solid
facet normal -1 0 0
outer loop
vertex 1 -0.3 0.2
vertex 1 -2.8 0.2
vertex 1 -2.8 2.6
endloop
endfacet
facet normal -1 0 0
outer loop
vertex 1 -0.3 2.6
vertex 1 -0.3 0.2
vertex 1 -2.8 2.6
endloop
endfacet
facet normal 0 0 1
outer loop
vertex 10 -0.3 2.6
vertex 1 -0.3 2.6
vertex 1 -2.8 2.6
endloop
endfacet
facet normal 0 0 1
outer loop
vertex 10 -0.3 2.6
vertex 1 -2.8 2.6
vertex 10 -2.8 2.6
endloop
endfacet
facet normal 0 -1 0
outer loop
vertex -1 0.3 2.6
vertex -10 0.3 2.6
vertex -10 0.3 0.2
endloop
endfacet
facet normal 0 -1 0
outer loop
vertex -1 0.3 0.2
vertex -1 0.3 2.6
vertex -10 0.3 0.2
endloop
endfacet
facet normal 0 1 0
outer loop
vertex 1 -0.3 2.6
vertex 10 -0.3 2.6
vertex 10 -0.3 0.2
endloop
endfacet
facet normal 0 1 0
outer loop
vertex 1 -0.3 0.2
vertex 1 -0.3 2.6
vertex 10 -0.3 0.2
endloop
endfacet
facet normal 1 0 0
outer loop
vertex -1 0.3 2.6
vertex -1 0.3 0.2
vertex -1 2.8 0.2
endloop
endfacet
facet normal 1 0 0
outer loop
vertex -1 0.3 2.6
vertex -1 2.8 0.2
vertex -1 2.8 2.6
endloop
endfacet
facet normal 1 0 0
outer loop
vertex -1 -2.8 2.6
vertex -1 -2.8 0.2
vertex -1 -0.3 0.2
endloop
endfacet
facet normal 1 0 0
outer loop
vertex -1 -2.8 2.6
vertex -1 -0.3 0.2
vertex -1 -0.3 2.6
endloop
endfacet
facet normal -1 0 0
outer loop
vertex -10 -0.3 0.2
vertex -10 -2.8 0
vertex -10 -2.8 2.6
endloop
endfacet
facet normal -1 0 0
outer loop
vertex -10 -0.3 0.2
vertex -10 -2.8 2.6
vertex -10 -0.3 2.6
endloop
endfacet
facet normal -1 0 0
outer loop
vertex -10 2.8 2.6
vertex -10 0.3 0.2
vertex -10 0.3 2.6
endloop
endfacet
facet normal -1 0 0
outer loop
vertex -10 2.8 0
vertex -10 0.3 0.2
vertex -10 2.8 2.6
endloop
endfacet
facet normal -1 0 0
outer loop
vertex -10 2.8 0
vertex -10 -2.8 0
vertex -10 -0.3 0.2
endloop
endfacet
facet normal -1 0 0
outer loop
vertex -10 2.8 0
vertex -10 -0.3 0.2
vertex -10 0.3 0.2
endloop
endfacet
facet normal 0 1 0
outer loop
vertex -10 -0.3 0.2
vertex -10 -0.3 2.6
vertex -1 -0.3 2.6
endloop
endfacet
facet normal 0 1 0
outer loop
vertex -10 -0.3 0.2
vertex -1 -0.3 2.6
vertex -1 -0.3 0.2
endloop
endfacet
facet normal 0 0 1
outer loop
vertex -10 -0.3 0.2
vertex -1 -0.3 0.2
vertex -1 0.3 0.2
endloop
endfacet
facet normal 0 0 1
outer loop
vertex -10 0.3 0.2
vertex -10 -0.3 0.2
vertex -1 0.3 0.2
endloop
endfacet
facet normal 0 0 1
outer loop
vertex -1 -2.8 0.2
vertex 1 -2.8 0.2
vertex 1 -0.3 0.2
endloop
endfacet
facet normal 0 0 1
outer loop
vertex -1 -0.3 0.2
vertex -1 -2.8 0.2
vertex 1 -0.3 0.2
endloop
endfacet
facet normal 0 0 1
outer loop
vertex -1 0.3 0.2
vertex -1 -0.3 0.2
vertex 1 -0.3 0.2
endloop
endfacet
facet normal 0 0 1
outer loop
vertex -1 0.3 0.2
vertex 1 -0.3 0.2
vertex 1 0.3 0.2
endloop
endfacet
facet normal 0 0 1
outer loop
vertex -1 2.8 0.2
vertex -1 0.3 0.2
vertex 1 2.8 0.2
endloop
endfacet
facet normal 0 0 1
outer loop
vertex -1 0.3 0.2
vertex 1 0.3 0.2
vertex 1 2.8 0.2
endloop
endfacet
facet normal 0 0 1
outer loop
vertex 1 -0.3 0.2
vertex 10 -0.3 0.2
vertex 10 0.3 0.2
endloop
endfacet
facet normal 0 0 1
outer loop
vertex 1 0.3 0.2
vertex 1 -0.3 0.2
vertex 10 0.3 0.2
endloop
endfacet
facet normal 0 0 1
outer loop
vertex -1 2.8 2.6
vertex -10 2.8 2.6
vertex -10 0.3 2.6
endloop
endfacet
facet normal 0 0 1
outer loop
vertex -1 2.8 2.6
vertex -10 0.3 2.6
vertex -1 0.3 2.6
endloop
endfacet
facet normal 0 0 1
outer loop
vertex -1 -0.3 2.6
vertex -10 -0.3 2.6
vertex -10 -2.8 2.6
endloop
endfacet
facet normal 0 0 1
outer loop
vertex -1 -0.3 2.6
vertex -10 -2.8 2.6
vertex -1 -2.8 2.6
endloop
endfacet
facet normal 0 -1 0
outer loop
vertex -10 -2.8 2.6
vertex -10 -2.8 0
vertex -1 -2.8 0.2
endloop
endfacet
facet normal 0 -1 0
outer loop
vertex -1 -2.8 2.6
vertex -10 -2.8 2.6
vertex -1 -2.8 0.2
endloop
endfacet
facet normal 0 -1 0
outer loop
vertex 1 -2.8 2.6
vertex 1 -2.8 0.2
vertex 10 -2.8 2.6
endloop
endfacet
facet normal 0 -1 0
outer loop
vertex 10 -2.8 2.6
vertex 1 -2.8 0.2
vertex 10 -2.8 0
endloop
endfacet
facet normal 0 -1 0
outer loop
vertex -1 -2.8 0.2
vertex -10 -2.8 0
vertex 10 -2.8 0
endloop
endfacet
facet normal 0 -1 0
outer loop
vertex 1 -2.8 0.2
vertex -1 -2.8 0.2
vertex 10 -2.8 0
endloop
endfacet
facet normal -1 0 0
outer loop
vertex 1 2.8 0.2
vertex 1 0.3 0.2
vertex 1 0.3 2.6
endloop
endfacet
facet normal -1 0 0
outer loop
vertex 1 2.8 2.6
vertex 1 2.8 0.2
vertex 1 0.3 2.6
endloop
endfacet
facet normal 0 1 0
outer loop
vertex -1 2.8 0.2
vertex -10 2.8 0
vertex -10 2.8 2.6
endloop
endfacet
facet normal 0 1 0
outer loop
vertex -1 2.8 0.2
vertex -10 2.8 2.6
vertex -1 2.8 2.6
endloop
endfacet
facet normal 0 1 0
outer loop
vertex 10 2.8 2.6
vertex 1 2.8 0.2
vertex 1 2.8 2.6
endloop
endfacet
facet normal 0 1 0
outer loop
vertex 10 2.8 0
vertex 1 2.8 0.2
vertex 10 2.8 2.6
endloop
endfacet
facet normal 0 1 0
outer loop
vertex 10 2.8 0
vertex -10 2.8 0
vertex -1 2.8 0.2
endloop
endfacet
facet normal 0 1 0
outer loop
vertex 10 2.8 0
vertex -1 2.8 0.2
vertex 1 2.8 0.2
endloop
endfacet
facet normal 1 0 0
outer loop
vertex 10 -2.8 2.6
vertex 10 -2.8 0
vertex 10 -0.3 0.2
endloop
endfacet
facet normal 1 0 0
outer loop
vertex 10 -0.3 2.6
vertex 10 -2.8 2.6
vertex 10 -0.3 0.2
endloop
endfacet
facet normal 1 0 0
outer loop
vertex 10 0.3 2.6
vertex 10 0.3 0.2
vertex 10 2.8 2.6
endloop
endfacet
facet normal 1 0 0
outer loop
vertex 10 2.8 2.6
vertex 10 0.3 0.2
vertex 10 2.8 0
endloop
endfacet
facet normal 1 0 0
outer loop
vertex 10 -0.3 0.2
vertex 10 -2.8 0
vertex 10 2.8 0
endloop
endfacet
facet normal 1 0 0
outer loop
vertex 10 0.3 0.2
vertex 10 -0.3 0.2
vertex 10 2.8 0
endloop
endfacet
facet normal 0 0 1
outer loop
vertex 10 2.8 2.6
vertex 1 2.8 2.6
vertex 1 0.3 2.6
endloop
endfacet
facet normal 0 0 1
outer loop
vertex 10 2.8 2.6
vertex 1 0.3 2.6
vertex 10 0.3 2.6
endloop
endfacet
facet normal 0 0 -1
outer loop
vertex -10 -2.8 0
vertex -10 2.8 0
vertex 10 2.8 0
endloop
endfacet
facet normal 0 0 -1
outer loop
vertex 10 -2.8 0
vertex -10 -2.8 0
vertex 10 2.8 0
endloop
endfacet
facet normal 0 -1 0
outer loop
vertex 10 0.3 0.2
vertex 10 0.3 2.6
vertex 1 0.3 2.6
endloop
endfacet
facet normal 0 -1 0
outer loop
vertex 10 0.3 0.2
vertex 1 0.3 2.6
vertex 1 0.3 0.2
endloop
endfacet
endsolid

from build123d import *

# Parameters (mm, degrees)
SKETCH_1_W          = 20
SKETCH_1_H          = 5.6
EXTRUDE_1_DEPTH     = 2.6
SKETCH_2_W          = 2.4
SKETCH_2_H          = 0.6
CUT_EXTRUDE_1_DEPTH = 21
SKETCH_3_W          = 2
SKETCH_3_H          = 2.4
CUT_EXTRUDE_2_DEPTH = 6.6


with BuildPart() as part:
    # 草图1 → 凸台-拉伸1 (new body)
    with BuildSketch(Plane.XY):
        Rectangle(SKETCH_1_W, SKETCH_1_H)
    extrude(amount=EXTRUDE_1_DEPTH)

    # 草图2 → 切除-拉伸1 (cut, through all)
    with BuildSketch(Plane(origin=(10, 0, 0), x_dir=(0, 0, -1), z_dir=(1, 0, 0))):
        with Locations((-1.4, 0)):
            Rectangle(SKETCH_2_W, SKETCH_2_H)
    extrude(amount=-CUT_EXTRUDE_1_DEPTH, mode=Mode.SUBTRACT)

    # 草图3 → 切除-拉伸2 (cut, through all)
    with BuildSketch(Plane.XZ.offset(2.8)):
        with Locations((0, 1.4)):
            Rectangle(SKETCH_3_W, SKETCH_3_H)
    extrude(amount=-CUT_EXTRUDE_2_DEPTH, mode=Mode.SUBTRACT)


solid = part.part
